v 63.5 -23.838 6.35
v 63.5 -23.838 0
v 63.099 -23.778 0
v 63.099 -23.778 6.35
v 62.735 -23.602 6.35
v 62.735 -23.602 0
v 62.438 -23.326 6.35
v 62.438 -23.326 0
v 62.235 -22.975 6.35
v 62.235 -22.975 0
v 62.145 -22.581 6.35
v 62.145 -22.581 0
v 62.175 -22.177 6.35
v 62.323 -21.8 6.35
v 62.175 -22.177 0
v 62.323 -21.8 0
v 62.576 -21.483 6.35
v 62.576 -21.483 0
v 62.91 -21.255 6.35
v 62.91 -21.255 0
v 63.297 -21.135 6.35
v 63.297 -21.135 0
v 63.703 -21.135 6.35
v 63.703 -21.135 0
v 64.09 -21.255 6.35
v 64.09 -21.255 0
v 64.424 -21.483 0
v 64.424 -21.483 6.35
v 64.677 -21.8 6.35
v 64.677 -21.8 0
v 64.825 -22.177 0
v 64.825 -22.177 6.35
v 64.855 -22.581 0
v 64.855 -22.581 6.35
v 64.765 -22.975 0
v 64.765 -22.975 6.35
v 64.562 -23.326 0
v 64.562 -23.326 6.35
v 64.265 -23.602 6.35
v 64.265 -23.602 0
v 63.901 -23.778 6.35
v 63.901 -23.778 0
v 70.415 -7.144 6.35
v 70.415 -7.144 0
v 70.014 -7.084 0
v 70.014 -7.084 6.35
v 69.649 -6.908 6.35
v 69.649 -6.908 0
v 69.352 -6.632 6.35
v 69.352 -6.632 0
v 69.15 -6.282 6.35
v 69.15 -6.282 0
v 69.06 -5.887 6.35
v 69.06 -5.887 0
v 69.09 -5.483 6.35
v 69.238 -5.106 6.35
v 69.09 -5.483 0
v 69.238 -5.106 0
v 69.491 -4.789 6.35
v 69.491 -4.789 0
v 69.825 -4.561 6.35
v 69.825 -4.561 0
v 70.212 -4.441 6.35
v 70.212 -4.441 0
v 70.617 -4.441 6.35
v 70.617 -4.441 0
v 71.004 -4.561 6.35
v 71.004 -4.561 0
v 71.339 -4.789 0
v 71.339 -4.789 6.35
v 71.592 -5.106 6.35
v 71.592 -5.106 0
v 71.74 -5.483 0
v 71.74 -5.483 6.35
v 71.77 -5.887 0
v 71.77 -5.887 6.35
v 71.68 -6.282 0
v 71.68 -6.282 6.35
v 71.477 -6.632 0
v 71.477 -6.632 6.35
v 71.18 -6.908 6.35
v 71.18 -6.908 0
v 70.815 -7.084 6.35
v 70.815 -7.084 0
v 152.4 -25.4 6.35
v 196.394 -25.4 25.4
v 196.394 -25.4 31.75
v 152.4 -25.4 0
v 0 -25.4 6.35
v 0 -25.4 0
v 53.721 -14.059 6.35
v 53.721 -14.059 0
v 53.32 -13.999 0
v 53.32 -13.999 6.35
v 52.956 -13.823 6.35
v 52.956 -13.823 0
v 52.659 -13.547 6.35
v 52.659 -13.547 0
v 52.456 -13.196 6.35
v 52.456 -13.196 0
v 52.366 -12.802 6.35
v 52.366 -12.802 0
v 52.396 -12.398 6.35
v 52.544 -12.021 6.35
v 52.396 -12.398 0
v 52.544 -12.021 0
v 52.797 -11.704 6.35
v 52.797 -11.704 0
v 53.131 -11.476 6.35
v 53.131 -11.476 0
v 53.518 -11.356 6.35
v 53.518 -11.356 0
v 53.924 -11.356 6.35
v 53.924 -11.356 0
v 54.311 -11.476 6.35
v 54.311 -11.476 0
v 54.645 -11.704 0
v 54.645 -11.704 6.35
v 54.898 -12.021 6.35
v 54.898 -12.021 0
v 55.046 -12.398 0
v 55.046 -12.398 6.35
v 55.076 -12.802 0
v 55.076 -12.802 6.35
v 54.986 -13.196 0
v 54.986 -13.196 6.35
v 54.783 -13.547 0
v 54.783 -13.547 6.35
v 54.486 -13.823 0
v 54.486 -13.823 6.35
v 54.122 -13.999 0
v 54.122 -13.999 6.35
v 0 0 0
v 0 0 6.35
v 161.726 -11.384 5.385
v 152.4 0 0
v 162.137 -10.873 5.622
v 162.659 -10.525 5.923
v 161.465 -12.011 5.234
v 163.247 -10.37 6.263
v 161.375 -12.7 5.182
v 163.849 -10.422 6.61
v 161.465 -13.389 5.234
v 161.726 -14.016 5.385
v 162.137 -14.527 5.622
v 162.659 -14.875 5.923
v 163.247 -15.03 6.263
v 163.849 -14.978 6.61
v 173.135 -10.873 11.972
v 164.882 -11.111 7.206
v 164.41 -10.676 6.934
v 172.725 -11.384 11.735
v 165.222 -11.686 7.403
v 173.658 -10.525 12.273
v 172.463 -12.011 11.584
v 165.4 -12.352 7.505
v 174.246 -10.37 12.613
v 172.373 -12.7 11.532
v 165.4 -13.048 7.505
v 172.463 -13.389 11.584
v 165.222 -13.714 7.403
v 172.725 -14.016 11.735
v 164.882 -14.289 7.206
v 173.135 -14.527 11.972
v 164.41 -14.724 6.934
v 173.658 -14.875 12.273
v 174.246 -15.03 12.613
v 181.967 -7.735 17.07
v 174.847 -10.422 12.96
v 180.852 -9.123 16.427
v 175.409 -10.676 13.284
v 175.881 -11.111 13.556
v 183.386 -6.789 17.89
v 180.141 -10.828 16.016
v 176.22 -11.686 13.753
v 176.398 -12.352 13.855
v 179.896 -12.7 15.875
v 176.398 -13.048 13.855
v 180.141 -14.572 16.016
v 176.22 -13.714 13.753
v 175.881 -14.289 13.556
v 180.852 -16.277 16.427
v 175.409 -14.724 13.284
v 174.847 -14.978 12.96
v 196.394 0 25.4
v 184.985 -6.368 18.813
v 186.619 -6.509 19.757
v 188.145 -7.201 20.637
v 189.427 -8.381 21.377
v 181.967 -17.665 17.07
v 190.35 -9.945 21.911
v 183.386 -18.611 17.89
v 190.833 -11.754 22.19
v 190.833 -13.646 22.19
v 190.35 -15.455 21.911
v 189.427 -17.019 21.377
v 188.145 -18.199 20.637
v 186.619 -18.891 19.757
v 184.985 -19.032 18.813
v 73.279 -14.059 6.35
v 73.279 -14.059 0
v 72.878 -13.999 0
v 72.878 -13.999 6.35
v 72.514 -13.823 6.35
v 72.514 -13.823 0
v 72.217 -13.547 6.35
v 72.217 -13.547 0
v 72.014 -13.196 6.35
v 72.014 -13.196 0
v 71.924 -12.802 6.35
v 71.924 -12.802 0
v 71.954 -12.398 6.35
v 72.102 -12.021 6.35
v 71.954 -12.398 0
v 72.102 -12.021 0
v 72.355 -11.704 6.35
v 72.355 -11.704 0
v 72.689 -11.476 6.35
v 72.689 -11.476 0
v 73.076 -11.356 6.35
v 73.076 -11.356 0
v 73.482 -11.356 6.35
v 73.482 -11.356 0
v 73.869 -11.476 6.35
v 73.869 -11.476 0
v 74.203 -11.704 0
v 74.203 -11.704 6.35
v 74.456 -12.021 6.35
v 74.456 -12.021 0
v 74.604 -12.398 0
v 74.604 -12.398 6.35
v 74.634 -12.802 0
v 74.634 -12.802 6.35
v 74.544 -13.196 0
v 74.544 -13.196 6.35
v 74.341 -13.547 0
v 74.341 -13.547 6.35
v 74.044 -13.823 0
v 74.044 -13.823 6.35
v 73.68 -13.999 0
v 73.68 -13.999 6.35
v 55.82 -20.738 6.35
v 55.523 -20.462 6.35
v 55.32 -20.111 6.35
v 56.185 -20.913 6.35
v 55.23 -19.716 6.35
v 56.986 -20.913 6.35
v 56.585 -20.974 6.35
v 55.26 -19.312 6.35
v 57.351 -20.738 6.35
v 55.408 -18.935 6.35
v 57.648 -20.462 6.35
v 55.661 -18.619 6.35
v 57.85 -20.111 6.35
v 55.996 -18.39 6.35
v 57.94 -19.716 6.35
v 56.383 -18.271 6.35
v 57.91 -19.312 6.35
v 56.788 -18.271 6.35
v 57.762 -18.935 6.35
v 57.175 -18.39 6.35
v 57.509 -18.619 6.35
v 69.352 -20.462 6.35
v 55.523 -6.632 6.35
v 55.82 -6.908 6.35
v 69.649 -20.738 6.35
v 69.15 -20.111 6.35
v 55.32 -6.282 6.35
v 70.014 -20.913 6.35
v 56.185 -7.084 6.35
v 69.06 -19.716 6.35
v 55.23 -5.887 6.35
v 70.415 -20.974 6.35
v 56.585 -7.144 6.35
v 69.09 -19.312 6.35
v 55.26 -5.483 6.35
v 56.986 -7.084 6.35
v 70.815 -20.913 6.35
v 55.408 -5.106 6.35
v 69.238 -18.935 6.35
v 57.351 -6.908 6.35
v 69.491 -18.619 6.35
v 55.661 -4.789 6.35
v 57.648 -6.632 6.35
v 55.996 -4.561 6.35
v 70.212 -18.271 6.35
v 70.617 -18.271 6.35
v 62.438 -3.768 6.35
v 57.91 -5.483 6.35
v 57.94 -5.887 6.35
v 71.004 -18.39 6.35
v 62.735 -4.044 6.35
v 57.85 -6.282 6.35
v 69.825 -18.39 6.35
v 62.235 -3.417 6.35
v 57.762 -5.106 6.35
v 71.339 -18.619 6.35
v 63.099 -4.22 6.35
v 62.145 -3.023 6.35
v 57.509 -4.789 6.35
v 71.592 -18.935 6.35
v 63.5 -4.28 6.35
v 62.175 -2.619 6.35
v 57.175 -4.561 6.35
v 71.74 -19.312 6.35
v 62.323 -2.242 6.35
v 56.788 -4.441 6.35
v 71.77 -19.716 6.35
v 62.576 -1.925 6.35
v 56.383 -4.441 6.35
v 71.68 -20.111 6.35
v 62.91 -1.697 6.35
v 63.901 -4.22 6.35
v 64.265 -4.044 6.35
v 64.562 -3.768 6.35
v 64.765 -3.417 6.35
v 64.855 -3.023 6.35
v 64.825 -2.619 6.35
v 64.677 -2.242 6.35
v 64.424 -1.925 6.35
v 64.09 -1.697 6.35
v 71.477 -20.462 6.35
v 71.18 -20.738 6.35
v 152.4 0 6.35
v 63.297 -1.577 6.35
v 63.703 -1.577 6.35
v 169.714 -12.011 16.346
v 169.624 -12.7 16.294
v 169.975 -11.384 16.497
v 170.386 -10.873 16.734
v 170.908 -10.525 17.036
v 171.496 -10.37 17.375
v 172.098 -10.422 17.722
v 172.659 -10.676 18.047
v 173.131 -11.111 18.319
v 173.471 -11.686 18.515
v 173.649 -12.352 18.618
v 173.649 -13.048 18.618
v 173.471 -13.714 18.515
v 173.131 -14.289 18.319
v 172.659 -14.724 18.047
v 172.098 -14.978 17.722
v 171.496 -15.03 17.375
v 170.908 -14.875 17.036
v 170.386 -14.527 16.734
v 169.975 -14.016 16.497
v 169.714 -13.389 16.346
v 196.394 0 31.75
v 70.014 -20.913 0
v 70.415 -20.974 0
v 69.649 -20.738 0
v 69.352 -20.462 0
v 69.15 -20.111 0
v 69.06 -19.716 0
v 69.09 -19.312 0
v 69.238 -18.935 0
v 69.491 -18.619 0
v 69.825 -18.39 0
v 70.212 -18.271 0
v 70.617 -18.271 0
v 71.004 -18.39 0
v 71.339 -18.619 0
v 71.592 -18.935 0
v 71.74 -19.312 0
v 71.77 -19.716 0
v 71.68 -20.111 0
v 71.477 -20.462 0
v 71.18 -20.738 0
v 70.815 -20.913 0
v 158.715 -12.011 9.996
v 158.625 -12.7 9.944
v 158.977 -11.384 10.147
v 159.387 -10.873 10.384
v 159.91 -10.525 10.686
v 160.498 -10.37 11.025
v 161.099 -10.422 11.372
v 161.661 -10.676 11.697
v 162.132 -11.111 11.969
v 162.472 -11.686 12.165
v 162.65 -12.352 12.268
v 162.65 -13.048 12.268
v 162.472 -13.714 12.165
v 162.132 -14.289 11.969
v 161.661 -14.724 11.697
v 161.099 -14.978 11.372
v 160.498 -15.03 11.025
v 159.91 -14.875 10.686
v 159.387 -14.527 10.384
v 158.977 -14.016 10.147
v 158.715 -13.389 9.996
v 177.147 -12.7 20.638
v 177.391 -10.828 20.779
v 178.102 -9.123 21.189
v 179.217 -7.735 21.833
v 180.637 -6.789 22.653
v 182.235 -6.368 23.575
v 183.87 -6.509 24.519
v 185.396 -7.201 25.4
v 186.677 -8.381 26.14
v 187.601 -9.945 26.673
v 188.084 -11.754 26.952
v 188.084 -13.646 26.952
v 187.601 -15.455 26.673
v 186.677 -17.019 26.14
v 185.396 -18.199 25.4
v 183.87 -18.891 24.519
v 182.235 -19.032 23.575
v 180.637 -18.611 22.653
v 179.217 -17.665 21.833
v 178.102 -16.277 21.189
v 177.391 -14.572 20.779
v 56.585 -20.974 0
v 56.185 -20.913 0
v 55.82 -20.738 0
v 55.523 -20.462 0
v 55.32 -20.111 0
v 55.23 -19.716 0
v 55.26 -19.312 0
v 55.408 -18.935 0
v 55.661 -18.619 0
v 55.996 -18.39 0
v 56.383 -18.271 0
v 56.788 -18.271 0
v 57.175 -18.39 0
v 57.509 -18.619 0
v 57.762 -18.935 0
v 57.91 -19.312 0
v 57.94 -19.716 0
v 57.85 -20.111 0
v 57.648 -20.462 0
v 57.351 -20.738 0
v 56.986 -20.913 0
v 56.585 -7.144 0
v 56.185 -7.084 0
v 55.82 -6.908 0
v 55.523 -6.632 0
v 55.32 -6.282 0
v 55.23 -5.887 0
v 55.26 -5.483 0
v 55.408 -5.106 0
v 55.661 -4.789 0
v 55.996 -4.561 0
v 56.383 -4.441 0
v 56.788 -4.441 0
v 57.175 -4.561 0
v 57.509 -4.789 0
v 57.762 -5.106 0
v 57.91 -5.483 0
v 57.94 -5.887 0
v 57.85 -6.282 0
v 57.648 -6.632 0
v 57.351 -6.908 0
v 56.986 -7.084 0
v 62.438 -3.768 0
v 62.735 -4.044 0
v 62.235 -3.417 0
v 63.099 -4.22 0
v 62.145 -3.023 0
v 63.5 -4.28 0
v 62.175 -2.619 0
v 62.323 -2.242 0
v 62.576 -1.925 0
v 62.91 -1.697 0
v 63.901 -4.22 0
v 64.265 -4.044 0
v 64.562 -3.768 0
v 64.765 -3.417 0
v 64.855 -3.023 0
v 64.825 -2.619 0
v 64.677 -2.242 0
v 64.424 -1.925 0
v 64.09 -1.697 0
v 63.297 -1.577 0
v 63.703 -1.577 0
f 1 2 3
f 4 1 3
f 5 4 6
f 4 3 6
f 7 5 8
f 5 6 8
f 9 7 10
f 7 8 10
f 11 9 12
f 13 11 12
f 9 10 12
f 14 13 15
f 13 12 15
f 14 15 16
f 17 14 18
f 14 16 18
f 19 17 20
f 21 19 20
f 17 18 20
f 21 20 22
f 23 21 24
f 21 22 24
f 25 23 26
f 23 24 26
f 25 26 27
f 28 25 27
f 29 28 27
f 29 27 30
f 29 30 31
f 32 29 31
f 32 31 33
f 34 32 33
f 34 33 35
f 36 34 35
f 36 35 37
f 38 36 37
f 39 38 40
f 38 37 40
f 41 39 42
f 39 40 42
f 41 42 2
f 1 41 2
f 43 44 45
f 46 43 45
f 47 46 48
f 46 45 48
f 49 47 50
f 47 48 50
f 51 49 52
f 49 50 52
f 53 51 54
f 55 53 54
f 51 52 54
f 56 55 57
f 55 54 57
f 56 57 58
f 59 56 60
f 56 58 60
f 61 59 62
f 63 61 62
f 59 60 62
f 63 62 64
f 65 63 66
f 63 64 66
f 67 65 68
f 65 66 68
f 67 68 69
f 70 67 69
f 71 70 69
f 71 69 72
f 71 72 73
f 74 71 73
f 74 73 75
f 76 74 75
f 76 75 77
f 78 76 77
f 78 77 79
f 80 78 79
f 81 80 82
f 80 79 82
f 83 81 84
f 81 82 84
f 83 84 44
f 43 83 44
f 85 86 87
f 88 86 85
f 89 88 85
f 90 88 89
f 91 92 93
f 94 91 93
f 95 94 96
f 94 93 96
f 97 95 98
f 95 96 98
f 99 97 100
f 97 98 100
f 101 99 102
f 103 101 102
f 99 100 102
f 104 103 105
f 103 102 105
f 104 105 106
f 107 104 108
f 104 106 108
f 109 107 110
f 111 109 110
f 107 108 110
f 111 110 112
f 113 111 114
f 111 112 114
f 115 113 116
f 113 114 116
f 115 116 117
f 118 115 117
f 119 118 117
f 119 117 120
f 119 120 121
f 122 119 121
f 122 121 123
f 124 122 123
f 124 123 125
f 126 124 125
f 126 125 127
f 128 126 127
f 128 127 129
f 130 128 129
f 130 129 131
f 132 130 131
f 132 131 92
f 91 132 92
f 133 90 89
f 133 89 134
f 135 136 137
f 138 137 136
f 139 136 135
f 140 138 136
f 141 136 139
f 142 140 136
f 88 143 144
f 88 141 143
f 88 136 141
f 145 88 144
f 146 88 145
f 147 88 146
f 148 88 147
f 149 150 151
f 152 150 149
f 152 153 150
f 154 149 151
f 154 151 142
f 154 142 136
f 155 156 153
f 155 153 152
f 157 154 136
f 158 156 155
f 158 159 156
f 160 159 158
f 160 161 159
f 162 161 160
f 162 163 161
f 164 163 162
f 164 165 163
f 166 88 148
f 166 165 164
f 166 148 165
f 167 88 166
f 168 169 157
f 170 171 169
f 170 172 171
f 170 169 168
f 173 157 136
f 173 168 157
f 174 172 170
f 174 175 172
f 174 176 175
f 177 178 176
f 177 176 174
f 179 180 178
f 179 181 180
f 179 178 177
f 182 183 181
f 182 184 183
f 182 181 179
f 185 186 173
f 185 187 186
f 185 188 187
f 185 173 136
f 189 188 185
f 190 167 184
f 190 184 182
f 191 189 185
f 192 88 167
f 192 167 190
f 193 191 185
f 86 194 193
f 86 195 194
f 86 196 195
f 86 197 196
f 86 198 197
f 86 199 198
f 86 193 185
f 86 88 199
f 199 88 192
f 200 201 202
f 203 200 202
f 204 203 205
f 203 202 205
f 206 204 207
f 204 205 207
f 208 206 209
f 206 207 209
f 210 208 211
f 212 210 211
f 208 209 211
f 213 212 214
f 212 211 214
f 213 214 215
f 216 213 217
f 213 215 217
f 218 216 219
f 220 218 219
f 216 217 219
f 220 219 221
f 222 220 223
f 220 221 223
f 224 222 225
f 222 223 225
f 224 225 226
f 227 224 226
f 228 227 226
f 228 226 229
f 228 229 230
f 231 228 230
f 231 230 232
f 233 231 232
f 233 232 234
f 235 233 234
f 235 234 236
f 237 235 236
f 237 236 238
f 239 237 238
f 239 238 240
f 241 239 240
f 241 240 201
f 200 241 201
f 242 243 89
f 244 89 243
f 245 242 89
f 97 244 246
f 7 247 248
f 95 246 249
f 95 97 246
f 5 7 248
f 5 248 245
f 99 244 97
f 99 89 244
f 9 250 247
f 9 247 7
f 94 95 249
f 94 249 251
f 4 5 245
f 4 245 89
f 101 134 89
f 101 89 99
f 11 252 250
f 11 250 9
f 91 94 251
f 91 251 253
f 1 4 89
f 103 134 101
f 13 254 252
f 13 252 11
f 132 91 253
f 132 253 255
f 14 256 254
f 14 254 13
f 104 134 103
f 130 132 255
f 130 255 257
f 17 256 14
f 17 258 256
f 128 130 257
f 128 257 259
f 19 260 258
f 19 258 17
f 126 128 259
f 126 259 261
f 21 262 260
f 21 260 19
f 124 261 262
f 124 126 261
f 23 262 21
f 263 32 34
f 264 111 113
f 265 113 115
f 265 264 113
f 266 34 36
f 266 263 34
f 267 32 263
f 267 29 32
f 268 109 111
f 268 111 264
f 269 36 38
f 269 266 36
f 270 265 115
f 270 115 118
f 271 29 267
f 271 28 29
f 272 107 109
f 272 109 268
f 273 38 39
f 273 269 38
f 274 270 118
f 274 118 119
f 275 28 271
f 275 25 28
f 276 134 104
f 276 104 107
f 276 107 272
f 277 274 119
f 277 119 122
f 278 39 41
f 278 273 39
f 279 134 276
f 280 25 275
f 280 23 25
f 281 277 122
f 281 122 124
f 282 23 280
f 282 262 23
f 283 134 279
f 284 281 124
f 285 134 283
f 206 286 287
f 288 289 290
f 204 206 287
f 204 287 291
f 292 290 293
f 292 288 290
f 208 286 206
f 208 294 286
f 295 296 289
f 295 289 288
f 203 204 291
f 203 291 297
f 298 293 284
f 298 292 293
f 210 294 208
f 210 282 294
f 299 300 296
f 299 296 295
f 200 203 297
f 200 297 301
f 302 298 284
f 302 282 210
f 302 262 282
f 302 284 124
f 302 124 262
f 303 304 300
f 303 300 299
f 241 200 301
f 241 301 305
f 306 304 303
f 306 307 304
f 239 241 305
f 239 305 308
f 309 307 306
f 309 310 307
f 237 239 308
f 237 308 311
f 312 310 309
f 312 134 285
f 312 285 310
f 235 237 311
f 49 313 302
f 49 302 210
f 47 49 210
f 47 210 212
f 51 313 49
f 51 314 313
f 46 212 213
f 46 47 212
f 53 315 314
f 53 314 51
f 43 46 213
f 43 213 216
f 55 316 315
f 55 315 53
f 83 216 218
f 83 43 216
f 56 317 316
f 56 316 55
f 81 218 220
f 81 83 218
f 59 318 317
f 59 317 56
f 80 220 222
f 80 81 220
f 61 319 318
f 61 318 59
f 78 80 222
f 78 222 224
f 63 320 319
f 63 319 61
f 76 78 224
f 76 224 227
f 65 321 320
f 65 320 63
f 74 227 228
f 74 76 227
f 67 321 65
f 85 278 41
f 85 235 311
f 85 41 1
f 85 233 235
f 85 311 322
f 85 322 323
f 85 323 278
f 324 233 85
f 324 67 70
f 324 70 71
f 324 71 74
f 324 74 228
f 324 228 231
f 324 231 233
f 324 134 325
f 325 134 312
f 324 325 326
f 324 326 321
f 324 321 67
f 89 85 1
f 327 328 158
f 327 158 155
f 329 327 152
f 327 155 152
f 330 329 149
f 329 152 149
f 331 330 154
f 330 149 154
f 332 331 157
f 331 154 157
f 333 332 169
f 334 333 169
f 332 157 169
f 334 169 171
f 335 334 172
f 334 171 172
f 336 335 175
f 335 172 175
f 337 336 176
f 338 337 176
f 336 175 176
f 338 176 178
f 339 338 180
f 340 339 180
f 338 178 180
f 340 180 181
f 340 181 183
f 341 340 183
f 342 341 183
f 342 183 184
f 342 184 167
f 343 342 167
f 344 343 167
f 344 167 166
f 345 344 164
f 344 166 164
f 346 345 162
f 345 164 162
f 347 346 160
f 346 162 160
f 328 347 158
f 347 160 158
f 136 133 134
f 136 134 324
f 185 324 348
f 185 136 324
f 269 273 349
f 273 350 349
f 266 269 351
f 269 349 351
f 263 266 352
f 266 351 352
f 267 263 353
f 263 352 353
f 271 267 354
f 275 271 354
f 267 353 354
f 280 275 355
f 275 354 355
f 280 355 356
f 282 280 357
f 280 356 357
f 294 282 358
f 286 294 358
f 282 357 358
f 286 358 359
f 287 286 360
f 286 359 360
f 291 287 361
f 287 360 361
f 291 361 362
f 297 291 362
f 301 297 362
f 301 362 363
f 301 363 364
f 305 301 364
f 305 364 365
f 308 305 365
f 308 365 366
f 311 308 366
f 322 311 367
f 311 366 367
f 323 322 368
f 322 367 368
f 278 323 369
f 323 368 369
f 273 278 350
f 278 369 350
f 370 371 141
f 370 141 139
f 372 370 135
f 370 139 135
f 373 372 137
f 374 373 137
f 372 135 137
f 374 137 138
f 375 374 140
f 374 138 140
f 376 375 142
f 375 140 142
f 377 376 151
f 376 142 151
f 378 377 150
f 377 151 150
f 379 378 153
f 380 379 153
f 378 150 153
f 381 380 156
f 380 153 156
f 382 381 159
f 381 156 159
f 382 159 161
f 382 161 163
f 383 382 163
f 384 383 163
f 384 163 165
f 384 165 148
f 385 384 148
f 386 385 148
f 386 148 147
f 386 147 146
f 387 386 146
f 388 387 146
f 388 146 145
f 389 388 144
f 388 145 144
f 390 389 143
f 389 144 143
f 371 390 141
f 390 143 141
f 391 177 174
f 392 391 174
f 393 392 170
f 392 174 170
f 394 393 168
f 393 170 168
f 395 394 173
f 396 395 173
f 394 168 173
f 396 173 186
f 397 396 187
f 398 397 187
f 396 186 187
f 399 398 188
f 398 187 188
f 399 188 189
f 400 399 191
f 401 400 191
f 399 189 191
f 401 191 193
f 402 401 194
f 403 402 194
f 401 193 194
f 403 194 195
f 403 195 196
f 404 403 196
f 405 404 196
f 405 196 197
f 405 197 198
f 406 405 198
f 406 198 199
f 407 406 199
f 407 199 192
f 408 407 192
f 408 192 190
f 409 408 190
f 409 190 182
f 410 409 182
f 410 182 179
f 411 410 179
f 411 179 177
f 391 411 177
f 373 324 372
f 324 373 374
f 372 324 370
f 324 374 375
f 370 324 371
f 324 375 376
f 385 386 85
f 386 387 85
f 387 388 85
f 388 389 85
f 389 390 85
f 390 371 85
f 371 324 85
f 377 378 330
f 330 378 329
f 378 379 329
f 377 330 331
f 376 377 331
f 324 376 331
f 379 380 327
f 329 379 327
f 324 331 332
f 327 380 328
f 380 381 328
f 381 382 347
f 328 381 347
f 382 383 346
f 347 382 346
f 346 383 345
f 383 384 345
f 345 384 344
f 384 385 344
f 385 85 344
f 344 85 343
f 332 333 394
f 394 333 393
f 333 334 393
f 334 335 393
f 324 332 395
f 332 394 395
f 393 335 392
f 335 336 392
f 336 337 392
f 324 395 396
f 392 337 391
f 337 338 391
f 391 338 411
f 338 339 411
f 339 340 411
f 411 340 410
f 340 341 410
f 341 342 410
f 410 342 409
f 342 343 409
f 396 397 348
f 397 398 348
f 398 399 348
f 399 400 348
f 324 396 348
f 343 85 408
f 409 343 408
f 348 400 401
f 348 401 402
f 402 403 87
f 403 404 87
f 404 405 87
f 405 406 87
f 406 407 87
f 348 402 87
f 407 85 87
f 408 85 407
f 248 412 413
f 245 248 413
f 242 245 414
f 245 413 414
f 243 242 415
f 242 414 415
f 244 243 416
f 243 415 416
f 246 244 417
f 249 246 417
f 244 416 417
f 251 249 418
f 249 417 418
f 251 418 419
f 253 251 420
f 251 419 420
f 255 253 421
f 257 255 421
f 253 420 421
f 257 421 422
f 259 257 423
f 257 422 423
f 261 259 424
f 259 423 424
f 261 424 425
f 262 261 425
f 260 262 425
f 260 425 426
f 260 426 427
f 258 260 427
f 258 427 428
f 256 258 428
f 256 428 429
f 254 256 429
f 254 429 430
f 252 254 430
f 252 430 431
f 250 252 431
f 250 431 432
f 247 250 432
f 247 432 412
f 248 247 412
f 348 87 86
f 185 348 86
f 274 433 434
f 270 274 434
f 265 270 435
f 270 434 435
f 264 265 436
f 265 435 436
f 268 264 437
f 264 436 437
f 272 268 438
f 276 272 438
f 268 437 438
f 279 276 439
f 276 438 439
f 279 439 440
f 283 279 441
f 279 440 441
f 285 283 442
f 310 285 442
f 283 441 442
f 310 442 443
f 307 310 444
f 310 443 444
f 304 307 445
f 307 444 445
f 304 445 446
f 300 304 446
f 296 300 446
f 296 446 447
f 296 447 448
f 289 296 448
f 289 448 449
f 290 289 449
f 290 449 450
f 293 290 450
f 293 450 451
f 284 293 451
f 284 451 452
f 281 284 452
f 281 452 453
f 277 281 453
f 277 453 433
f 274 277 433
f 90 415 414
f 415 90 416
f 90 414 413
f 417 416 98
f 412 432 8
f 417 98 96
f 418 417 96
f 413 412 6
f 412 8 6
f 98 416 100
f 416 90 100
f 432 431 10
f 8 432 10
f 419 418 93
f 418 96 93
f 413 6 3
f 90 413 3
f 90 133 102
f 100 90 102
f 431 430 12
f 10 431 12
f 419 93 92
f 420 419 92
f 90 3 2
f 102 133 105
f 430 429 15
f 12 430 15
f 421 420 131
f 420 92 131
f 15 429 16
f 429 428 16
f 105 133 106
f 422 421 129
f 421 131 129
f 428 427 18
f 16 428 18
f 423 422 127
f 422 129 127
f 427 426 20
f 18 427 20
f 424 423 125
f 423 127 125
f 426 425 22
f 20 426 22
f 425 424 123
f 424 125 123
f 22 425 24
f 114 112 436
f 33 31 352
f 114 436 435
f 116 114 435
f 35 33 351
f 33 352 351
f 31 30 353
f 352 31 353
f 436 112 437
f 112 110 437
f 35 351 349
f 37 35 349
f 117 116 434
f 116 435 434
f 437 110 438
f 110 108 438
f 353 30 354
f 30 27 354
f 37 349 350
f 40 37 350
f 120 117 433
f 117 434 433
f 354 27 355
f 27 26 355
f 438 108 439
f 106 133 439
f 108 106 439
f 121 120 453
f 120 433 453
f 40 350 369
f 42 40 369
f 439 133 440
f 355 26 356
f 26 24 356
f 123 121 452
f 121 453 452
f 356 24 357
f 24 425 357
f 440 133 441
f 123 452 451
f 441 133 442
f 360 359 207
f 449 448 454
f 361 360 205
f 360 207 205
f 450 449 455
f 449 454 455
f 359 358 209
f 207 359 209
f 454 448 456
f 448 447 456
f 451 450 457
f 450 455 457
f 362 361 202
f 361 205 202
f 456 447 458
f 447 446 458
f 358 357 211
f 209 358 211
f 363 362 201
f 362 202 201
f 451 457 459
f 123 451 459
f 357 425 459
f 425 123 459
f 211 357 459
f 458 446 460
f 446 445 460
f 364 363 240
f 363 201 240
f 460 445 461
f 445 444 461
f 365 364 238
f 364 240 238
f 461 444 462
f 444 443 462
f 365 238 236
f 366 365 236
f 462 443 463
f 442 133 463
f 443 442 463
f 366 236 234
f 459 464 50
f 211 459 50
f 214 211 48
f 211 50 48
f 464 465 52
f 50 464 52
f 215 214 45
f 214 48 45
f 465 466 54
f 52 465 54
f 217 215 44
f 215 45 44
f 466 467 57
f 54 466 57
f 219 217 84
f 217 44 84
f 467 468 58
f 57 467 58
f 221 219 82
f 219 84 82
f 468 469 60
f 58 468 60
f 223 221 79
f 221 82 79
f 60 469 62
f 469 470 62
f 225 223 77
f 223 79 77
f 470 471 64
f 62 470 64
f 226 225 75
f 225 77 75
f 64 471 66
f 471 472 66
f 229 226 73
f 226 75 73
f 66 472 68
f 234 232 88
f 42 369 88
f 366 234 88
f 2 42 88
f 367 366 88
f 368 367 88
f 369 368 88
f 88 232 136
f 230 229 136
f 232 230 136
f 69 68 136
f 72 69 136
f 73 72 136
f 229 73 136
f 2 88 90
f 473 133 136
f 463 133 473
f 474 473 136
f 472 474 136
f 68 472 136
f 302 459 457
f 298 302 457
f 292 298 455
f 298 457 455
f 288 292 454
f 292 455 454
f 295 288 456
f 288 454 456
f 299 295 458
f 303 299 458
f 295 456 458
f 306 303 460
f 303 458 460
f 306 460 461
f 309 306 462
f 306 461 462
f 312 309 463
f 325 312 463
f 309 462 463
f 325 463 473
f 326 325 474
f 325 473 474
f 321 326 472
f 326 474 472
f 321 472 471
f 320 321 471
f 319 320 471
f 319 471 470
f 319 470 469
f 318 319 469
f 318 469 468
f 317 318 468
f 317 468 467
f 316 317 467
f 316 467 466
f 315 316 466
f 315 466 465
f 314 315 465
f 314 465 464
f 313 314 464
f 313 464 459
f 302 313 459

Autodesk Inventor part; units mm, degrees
ref_plane "YZ Plane" through (0, 0, 0) normal (1, 0, 0) x (0, 1, 0)
ref_plane "XZ Plane" through (0, 0, 0) normal (0, 1, 0) x (-1, 0, 0)
ref_plane "XY Plane" through (0, 0, 0) normal (0, 0, 1) x (1, 0, 0)
sketch "Sketch1" plane through (0, 0, 0) normal (0, 0, 1) x (1, 0, 0)
  line L0 (0, 0) -> (152.4, 0)
  line L1 (152.4, 0) -> (152.4, -25.4)
  line L2 (152.4, -25.4) -> (0, -25.4)
  line L3 (0, -25.4) -> (0, 0)
  dimension "d0" = 152.4
  dimension "d1" = 25.4
extrude "Extrusion1" add sketch "Sketch1" along normal blind 6.35
sketch "Sketch4" plane through (0, 0, 6.35) normal (0, 0, 1) x (1, 0, 0)
  circle A0 centre (63.5, -2.921) radius 1.3589
  circle A1 centre (56.5852, -5.7852) radius 1.3589
  circle A2 centre (53.721, -12.7) radius 1.3589
  circle A3 centre (56.5852, -19.6148) radius 1.3589
  circle A4 centre (63.5, -22.479) radius 1.3589
  circle A5 centre (70.4148, -19.6148) radius 1.3589
  circle A6 centre (73.279, -12.7) radius 1.3589
  circle A7 centre (70.4148, -5.7852) radius 1.3589
  line L0 (0, -25.4) -> (152.4, -25.4) projected
  line L1 (152.4, 0) -> (0, 0) projected
  line L2 (152.4, -25.4) -> (152.4, 0) projected
  point P0 (9.525, 0)
  point P1 (63.5, -12.7)
  point P2 (254, 0)
  point P3 (254, -19.05)
  point P4 (63.5, -12.7)
  point P5 (63.5, -12.7)
  point P6 (63.5, -12.7)
  point P7 (63.5, -12.7)
  point P8 (63.5, -12.7)
  point P9 (63.5, -12.7)
  point P10 (63.5, -12.7)
  point P11 (11.43, 0)
  dimension "d71" = 2.7178
  dimension "d72" = 9.779
  dimension "d73" = 0
  dimension "d76" = 360
  dimension "d85" = 25.4
  dimension "d86" = 12.7
  dimension "d87" = 88.9
sketch "Sketch9" plane through (152.4, -25.4, 0) normal (0, -1, 0) x (1, 0, 0)
  line L0 (0, 0) -> (0, 6.35) projected
  line L1 (0, 0) -> (43.9941, 25.4)
  line L2 (0, 0) -> (50.8, 0) construction
  line L3 (0, 6.35) -> (43.9941, 31.75)
  line L4 (0, 6.35) -> (50.8, 6.35) construction
  line L5 (43.9941, 31.75) -> (43.9941, 25.4)
  point P0 (-152.4, 0)
  dimension "d53" = 50.8
  dimension "d54" = 30
  dimension "d55" = 50.8
  dimension "d56" = 30
extrude "Extrusion9" add sketch "Sketch9" against normal up to surface (25.4 mm away)
sketch "Sketch10" plane through (196.3941, -25.4, 25.4) normal (0.5, 0, -0.866) x (-0.866, 0, -0.5)
  line L0 (0, 0) -> (50.8, 0) projected
  line L1 (50.8, 25.4) -> (0, 25.4) projected
  line L2 (0, 0) -> (0, 25.4) projected
  circle A0 centre (38.1, 12.7) radius 2.3368
  circle A1 centre (25.4, 12.7) radius 2.3368
  circle A2 centre (12.7, 12.7) radius 6.35
  point P0 (182.7823, 25.4)
  dimension "d59" = 25.4
  dimension "d60" = 12.7
  dimension "d61" = 12.7
  dimension "d62" = 12.7
  dimension "d63" = 12.7
  dimension "d64" = 25.4
  dimension "d65" = 38.1
  dimension "d66" = 4.6736
  dimension "d67" = 4.6736
  dimension "d68" = 12.7
extrude "Extrusion10" cut sketch "Sketch10" against normal through all
hole "Hole1" at (70.4148, -5.7852, 6.35) at (73.279, -12.7, 6.35) at (70.4148, -19.6148, 6.35) at (63.5, -22.479, 6.35) at (56.5852, -19.6148, 6.35) at (53.721, -12.7, 6.35) at (56.5852, -5.7852, 6.35) at (63.5, -2.921, 6.35) direction (0, 0, -1) diameter 2.7178 end through all
equation "\"d86\" = 0.5 * d85"
equation "\"d55\" = d53"
equation "\"d60\" = 0.5 * d59"
equation "\"d61\" = d60"
equation "\"d62\" = d60"
properties part number "Wheel Arms"
